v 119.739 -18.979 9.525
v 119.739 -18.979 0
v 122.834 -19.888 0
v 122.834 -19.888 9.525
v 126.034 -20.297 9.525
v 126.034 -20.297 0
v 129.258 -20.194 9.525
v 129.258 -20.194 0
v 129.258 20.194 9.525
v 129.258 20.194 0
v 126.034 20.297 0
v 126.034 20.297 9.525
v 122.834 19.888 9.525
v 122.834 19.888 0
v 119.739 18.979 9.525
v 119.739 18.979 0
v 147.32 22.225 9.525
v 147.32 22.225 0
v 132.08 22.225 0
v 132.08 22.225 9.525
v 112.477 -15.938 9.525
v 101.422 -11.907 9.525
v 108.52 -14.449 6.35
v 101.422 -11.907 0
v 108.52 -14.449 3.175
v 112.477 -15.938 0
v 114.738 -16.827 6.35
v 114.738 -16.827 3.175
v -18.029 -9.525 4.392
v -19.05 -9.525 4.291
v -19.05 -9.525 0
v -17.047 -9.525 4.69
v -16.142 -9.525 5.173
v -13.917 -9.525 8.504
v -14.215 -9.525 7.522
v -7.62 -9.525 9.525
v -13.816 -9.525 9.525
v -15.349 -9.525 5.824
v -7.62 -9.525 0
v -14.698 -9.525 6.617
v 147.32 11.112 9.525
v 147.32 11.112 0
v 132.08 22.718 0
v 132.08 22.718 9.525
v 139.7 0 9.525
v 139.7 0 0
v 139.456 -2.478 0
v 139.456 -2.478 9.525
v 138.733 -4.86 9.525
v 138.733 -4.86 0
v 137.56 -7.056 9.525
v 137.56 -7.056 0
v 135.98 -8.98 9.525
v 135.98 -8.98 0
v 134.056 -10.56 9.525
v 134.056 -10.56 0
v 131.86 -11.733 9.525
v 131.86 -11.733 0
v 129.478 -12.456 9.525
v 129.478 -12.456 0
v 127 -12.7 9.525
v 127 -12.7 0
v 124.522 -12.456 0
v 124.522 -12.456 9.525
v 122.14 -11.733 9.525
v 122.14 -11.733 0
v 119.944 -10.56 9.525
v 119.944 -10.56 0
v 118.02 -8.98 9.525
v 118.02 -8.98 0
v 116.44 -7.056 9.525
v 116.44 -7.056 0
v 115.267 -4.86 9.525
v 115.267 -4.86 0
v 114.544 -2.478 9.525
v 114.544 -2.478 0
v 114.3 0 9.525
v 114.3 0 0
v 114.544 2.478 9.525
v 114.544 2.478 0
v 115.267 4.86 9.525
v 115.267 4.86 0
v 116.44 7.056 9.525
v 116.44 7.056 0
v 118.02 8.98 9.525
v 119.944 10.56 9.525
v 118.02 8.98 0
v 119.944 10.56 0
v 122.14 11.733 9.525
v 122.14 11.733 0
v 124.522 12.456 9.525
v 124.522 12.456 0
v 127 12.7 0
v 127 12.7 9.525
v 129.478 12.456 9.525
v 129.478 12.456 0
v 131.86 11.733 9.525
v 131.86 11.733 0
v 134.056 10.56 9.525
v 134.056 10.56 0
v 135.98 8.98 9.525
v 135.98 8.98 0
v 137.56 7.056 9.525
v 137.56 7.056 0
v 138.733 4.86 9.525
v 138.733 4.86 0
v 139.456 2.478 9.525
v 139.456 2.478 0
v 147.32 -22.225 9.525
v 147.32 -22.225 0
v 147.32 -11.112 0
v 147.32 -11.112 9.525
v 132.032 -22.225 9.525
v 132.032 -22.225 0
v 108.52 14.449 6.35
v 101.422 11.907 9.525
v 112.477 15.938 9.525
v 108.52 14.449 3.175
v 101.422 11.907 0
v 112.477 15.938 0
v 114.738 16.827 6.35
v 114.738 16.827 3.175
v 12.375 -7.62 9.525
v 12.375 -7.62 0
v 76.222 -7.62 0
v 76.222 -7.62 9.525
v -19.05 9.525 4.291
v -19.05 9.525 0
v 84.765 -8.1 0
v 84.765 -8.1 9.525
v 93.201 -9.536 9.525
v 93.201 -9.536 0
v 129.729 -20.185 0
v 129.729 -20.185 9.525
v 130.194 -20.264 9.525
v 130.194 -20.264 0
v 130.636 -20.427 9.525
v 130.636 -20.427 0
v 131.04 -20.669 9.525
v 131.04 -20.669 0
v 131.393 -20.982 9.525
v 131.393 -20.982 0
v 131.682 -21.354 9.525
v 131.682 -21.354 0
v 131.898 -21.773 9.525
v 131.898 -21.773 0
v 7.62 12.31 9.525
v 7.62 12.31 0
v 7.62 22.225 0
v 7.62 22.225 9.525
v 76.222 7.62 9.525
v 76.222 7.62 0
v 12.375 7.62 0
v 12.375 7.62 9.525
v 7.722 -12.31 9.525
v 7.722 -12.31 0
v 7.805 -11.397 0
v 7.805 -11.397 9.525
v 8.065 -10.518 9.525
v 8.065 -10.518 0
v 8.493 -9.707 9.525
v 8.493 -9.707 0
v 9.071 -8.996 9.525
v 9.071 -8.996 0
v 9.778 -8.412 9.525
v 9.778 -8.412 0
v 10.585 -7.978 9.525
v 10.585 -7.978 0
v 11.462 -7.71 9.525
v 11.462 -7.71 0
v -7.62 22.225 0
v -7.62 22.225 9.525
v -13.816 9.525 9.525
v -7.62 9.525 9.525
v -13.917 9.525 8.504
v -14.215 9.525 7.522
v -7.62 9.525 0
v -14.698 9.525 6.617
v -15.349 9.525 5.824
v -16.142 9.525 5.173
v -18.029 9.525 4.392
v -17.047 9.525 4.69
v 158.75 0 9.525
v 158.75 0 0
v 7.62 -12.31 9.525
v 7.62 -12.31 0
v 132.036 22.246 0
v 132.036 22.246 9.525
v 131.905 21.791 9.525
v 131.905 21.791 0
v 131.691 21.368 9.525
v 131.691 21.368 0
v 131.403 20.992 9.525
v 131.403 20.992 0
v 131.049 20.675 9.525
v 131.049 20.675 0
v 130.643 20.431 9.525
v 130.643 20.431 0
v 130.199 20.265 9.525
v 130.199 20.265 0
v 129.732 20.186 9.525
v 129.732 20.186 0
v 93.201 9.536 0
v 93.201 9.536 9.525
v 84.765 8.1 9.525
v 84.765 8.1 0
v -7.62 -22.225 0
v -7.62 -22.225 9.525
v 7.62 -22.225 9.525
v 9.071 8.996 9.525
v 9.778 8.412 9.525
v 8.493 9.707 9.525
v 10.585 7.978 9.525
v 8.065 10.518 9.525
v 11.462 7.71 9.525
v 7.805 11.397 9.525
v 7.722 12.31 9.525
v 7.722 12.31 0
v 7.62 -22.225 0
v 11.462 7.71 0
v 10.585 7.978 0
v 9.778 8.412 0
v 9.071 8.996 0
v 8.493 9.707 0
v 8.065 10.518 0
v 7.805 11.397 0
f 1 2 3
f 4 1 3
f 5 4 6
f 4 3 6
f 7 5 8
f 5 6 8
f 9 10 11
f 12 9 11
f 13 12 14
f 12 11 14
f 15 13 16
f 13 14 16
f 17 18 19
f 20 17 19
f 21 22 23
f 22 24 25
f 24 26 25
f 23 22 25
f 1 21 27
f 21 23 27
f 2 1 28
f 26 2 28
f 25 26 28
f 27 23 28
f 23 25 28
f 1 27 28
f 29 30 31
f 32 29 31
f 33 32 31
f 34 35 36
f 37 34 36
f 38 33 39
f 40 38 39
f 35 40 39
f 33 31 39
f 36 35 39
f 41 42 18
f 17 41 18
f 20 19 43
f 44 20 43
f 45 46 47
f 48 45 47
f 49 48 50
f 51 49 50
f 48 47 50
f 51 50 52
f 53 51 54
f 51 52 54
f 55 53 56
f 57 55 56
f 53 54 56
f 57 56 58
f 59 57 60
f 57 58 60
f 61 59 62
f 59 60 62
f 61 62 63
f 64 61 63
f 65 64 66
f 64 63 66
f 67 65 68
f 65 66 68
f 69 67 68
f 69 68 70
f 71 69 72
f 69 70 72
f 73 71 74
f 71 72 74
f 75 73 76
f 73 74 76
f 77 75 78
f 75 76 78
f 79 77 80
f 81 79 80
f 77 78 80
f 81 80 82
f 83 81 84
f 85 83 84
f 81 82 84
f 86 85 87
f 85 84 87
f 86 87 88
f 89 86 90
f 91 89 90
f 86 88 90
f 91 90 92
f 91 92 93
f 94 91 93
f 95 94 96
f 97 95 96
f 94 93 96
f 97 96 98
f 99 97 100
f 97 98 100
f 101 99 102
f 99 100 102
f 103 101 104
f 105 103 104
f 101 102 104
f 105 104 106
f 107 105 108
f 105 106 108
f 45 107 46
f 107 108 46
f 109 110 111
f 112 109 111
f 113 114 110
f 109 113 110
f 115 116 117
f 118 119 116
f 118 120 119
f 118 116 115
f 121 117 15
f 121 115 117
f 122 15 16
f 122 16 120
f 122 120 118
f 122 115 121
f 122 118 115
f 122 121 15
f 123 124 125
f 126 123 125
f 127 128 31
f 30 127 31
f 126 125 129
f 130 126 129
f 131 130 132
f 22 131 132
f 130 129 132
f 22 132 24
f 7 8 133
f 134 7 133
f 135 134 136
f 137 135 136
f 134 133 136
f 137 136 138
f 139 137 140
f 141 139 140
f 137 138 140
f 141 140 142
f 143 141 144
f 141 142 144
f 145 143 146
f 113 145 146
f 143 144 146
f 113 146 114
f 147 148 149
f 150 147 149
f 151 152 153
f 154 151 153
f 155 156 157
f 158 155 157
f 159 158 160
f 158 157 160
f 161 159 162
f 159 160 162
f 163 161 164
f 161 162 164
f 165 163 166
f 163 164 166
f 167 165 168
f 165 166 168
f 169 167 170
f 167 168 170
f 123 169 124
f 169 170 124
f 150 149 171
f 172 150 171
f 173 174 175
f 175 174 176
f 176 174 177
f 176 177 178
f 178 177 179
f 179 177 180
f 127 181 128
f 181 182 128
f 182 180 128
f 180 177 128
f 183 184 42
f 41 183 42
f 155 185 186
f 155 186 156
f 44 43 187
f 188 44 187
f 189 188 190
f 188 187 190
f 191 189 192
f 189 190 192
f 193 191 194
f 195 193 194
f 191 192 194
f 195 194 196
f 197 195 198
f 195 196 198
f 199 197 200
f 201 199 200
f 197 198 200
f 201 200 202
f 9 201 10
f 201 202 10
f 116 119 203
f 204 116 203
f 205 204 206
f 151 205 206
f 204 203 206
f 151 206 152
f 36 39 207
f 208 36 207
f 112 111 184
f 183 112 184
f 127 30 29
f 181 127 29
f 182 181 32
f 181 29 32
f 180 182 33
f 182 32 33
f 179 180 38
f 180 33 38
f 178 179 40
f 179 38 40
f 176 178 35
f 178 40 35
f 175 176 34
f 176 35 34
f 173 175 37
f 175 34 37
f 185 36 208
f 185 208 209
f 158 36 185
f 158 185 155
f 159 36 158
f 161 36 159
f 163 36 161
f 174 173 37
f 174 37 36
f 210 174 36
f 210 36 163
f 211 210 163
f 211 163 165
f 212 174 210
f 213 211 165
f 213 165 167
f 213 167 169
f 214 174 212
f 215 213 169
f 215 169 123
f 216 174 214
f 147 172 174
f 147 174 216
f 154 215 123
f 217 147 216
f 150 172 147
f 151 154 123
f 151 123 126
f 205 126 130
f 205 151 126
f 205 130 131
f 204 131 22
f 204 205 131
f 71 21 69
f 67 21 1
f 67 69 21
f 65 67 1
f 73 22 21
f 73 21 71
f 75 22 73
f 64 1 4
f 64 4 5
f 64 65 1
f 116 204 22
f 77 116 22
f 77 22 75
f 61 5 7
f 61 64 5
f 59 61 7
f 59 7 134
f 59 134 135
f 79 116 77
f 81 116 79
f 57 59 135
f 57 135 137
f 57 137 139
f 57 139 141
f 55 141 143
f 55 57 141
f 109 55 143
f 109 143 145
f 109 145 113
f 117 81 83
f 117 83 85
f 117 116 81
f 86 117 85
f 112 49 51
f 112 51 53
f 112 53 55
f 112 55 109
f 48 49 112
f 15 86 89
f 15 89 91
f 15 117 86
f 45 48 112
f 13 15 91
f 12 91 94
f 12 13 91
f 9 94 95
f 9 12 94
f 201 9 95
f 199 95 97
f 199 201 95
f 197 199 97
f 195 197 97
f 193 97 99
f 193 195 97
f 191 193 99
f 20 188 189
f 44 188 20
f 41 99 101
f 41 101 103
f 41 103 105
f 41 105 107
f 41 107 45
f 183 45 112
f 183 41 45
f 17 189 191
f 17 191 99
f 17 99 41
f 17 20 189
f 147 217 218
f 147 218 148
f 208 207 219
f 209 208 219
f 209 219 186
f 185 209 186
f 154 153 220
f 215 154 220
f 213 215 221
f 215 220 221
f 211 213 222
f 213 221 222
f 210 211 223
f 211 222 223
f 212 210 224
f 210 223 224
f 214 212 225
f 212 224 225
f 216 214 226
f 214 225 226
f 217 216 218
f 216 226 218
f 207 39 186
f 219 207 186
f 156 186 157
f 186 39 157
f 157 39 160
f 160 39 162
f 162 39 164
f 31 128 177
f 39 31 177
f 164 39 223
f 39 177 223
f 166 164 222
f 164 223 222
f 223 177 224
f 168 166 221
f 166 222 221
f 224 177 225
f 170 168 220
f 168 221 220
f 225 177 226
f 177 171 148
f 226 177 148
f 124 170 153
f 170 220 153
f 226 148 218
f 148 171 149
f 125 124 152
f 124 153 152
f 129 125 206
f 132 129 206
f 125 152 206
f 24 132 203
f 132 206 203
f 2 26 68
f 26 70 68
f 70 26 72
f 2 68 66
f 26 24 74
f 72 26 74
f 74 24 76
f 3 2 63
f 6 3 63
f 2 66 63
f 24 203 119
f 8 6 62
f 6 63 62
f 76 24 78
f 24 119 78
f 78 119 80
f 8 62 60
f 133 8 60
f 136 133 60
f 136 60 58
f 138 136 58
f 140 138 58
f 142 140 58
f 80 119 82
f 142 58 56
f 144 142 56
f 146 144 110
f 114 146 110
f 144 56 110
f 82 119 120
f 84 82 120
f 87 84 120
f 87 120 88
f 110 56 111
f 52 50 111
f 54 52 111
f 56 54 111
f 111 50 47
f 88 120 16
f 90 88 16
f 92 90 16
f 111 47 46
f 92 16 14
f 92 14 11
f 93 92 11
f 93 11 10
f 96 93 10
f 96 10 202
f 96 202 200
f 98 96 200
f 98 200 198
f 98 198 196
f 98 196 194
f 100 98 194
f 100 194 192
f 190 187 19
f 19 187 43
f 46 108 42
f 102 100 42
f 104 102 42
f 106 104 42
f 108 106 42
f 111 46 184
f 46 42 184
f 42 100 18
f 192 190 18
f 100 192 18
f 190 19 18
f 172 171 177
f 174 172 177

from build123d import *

# Parameters (mm, degrees)
F1_DEPTH = 9.525
F2_R     = 5.2336589489
F3_DEPTH = 25.4


with BuildPart() as f1:
    # F0 (on Top) → F1 (new body)
    with BuildSketch(Plane.XY):
        with BuildLine():
            Line((7.7218987456, 12.310102582), (7.62, 12.310102582))
            Line((7.62, 12.310102582), (7.62, 22.225))
            Line((7.62, 22.225), (-7.62, 22.225))
            Line((-7.62, 22.225), (-7.62, 9.525))
            Line((-7.62, 9.525), (-19.05, 9.525))
            Line((-19.05, 9.525), (-19.05, 0))
            Line((-19.05, 0), (-19.05, -9.525))
            Line((-19.05, -9.525), (-7.62, -9.525))
            Line((-7.62, -9.525), (-7.62, -22.225))
            Line((-7.62, -22.225), (7.62, -22.225))
            Line((7.62, -22.225), (7.62, -12.310102582))
            Line((7.62, -12.310102582), (7.7218987456, -12.310102582))
            ThreePointArc((7.7218987456, -12.310102582), (9.0713316669, -8.995991319), (12.3745044693, -7.62))
            Line((12.3745044693, -7.62), (76.2223307455, -7.62))
            ThreePointArc((76.2223307455, -7.62), (89.0032784798, -8.6995142786), (101.4220945716, -11.907470472))
            add(Edge.make_bspline(
                [(101.4220945716, -11.907470472), (108.8479078103, -14.5096420416), (115.4579135782, -16.9617020129), (119.7392494006, -18.9785115521)],
                knots=[0.2329982419, 0.2329982419, 0.2329982419, 0.2329982419, 0.665918316, 0.665918316, 0.665918316, 0.665918316], degree=3))
            ThreePointArc((119.7392494006, -18.9785115521), (124.4257242361, -20.1562770444), (129.2577777778, -20.1941783568))
            ThreePointArc((129.2577777778, -20.1941783568), (131.0404681386, -20.6690128346), (132.0316072031, -22.225))
            Line((132.0316072031, -22.225), (147.32, -22.225))
            Line((147.32, -22.225), (147.32, -11.1125))
            Line((147.32, -11.1125), (158.75, 0))
            Line((158.75, 0), (147.32, 11.1125))
            Line((147.32, 11.1125), (147.32, 22.225))
            Line((147.32, 22.225), (132.08, 22.225))
            Line((132.08, 22.225), (132.08, 22.7184506514))
            ThreePointArc((132.08, 22.7184506514), (131.2333333333, 20.8252464304), (129.2577777778, 20.1941783568))
            ThreePointArc((129.2577777778, 20.1941783568), (124.4257242361, 20.1562770444), (119.7392494006, 18.9785115521))
            add(Edge.make_bspline(
                [(101.4220945716, 11.907470472), (108.8479078103, 14.5096420416), (115.4579135782, 16.9617020129), (119.7392494006, 18.9785115521)],
                knots=[0.2329982419, 0.2329982419, 0.2329982419, 0.2329982419, 0.665918316, 0.665918316, 0.665918316, 0.665918316], degree=3))
            ThreePointArc((101.4220945716, 11.907470472), (89.0032784798, 8.6995142786), (76.2223307455, 7.62))
            Line((76.2223307455, 7.62), (12.3745044693, 7.62))
            ThreePointArc((12.3745044693, 7.62), (9.0713316669, 8.995991319), (7.7218987456, 12.310102582))
        make_face()
        with BuildLine():
            ThreePointArc((114.3, 0), (127, 12.7), (139.7, 0))
            ThreePointArc((139.7, 0), (127, -12.7), (114.3, 0))
        make_face(mode=Mode.SUBTRACT)
    extrude(amount=F1_DEPTH)

    # F2 (on face) → F3 (cut)
    with BuildSketch(Plane.XZ.offset(9.525)):
        with Locations((-19.05, 9.525)):
            Circle(F2_R)
    extrude(amount=-F3_DEPTH, mode=Mode.SUBTRACT)


solid = f1.part
